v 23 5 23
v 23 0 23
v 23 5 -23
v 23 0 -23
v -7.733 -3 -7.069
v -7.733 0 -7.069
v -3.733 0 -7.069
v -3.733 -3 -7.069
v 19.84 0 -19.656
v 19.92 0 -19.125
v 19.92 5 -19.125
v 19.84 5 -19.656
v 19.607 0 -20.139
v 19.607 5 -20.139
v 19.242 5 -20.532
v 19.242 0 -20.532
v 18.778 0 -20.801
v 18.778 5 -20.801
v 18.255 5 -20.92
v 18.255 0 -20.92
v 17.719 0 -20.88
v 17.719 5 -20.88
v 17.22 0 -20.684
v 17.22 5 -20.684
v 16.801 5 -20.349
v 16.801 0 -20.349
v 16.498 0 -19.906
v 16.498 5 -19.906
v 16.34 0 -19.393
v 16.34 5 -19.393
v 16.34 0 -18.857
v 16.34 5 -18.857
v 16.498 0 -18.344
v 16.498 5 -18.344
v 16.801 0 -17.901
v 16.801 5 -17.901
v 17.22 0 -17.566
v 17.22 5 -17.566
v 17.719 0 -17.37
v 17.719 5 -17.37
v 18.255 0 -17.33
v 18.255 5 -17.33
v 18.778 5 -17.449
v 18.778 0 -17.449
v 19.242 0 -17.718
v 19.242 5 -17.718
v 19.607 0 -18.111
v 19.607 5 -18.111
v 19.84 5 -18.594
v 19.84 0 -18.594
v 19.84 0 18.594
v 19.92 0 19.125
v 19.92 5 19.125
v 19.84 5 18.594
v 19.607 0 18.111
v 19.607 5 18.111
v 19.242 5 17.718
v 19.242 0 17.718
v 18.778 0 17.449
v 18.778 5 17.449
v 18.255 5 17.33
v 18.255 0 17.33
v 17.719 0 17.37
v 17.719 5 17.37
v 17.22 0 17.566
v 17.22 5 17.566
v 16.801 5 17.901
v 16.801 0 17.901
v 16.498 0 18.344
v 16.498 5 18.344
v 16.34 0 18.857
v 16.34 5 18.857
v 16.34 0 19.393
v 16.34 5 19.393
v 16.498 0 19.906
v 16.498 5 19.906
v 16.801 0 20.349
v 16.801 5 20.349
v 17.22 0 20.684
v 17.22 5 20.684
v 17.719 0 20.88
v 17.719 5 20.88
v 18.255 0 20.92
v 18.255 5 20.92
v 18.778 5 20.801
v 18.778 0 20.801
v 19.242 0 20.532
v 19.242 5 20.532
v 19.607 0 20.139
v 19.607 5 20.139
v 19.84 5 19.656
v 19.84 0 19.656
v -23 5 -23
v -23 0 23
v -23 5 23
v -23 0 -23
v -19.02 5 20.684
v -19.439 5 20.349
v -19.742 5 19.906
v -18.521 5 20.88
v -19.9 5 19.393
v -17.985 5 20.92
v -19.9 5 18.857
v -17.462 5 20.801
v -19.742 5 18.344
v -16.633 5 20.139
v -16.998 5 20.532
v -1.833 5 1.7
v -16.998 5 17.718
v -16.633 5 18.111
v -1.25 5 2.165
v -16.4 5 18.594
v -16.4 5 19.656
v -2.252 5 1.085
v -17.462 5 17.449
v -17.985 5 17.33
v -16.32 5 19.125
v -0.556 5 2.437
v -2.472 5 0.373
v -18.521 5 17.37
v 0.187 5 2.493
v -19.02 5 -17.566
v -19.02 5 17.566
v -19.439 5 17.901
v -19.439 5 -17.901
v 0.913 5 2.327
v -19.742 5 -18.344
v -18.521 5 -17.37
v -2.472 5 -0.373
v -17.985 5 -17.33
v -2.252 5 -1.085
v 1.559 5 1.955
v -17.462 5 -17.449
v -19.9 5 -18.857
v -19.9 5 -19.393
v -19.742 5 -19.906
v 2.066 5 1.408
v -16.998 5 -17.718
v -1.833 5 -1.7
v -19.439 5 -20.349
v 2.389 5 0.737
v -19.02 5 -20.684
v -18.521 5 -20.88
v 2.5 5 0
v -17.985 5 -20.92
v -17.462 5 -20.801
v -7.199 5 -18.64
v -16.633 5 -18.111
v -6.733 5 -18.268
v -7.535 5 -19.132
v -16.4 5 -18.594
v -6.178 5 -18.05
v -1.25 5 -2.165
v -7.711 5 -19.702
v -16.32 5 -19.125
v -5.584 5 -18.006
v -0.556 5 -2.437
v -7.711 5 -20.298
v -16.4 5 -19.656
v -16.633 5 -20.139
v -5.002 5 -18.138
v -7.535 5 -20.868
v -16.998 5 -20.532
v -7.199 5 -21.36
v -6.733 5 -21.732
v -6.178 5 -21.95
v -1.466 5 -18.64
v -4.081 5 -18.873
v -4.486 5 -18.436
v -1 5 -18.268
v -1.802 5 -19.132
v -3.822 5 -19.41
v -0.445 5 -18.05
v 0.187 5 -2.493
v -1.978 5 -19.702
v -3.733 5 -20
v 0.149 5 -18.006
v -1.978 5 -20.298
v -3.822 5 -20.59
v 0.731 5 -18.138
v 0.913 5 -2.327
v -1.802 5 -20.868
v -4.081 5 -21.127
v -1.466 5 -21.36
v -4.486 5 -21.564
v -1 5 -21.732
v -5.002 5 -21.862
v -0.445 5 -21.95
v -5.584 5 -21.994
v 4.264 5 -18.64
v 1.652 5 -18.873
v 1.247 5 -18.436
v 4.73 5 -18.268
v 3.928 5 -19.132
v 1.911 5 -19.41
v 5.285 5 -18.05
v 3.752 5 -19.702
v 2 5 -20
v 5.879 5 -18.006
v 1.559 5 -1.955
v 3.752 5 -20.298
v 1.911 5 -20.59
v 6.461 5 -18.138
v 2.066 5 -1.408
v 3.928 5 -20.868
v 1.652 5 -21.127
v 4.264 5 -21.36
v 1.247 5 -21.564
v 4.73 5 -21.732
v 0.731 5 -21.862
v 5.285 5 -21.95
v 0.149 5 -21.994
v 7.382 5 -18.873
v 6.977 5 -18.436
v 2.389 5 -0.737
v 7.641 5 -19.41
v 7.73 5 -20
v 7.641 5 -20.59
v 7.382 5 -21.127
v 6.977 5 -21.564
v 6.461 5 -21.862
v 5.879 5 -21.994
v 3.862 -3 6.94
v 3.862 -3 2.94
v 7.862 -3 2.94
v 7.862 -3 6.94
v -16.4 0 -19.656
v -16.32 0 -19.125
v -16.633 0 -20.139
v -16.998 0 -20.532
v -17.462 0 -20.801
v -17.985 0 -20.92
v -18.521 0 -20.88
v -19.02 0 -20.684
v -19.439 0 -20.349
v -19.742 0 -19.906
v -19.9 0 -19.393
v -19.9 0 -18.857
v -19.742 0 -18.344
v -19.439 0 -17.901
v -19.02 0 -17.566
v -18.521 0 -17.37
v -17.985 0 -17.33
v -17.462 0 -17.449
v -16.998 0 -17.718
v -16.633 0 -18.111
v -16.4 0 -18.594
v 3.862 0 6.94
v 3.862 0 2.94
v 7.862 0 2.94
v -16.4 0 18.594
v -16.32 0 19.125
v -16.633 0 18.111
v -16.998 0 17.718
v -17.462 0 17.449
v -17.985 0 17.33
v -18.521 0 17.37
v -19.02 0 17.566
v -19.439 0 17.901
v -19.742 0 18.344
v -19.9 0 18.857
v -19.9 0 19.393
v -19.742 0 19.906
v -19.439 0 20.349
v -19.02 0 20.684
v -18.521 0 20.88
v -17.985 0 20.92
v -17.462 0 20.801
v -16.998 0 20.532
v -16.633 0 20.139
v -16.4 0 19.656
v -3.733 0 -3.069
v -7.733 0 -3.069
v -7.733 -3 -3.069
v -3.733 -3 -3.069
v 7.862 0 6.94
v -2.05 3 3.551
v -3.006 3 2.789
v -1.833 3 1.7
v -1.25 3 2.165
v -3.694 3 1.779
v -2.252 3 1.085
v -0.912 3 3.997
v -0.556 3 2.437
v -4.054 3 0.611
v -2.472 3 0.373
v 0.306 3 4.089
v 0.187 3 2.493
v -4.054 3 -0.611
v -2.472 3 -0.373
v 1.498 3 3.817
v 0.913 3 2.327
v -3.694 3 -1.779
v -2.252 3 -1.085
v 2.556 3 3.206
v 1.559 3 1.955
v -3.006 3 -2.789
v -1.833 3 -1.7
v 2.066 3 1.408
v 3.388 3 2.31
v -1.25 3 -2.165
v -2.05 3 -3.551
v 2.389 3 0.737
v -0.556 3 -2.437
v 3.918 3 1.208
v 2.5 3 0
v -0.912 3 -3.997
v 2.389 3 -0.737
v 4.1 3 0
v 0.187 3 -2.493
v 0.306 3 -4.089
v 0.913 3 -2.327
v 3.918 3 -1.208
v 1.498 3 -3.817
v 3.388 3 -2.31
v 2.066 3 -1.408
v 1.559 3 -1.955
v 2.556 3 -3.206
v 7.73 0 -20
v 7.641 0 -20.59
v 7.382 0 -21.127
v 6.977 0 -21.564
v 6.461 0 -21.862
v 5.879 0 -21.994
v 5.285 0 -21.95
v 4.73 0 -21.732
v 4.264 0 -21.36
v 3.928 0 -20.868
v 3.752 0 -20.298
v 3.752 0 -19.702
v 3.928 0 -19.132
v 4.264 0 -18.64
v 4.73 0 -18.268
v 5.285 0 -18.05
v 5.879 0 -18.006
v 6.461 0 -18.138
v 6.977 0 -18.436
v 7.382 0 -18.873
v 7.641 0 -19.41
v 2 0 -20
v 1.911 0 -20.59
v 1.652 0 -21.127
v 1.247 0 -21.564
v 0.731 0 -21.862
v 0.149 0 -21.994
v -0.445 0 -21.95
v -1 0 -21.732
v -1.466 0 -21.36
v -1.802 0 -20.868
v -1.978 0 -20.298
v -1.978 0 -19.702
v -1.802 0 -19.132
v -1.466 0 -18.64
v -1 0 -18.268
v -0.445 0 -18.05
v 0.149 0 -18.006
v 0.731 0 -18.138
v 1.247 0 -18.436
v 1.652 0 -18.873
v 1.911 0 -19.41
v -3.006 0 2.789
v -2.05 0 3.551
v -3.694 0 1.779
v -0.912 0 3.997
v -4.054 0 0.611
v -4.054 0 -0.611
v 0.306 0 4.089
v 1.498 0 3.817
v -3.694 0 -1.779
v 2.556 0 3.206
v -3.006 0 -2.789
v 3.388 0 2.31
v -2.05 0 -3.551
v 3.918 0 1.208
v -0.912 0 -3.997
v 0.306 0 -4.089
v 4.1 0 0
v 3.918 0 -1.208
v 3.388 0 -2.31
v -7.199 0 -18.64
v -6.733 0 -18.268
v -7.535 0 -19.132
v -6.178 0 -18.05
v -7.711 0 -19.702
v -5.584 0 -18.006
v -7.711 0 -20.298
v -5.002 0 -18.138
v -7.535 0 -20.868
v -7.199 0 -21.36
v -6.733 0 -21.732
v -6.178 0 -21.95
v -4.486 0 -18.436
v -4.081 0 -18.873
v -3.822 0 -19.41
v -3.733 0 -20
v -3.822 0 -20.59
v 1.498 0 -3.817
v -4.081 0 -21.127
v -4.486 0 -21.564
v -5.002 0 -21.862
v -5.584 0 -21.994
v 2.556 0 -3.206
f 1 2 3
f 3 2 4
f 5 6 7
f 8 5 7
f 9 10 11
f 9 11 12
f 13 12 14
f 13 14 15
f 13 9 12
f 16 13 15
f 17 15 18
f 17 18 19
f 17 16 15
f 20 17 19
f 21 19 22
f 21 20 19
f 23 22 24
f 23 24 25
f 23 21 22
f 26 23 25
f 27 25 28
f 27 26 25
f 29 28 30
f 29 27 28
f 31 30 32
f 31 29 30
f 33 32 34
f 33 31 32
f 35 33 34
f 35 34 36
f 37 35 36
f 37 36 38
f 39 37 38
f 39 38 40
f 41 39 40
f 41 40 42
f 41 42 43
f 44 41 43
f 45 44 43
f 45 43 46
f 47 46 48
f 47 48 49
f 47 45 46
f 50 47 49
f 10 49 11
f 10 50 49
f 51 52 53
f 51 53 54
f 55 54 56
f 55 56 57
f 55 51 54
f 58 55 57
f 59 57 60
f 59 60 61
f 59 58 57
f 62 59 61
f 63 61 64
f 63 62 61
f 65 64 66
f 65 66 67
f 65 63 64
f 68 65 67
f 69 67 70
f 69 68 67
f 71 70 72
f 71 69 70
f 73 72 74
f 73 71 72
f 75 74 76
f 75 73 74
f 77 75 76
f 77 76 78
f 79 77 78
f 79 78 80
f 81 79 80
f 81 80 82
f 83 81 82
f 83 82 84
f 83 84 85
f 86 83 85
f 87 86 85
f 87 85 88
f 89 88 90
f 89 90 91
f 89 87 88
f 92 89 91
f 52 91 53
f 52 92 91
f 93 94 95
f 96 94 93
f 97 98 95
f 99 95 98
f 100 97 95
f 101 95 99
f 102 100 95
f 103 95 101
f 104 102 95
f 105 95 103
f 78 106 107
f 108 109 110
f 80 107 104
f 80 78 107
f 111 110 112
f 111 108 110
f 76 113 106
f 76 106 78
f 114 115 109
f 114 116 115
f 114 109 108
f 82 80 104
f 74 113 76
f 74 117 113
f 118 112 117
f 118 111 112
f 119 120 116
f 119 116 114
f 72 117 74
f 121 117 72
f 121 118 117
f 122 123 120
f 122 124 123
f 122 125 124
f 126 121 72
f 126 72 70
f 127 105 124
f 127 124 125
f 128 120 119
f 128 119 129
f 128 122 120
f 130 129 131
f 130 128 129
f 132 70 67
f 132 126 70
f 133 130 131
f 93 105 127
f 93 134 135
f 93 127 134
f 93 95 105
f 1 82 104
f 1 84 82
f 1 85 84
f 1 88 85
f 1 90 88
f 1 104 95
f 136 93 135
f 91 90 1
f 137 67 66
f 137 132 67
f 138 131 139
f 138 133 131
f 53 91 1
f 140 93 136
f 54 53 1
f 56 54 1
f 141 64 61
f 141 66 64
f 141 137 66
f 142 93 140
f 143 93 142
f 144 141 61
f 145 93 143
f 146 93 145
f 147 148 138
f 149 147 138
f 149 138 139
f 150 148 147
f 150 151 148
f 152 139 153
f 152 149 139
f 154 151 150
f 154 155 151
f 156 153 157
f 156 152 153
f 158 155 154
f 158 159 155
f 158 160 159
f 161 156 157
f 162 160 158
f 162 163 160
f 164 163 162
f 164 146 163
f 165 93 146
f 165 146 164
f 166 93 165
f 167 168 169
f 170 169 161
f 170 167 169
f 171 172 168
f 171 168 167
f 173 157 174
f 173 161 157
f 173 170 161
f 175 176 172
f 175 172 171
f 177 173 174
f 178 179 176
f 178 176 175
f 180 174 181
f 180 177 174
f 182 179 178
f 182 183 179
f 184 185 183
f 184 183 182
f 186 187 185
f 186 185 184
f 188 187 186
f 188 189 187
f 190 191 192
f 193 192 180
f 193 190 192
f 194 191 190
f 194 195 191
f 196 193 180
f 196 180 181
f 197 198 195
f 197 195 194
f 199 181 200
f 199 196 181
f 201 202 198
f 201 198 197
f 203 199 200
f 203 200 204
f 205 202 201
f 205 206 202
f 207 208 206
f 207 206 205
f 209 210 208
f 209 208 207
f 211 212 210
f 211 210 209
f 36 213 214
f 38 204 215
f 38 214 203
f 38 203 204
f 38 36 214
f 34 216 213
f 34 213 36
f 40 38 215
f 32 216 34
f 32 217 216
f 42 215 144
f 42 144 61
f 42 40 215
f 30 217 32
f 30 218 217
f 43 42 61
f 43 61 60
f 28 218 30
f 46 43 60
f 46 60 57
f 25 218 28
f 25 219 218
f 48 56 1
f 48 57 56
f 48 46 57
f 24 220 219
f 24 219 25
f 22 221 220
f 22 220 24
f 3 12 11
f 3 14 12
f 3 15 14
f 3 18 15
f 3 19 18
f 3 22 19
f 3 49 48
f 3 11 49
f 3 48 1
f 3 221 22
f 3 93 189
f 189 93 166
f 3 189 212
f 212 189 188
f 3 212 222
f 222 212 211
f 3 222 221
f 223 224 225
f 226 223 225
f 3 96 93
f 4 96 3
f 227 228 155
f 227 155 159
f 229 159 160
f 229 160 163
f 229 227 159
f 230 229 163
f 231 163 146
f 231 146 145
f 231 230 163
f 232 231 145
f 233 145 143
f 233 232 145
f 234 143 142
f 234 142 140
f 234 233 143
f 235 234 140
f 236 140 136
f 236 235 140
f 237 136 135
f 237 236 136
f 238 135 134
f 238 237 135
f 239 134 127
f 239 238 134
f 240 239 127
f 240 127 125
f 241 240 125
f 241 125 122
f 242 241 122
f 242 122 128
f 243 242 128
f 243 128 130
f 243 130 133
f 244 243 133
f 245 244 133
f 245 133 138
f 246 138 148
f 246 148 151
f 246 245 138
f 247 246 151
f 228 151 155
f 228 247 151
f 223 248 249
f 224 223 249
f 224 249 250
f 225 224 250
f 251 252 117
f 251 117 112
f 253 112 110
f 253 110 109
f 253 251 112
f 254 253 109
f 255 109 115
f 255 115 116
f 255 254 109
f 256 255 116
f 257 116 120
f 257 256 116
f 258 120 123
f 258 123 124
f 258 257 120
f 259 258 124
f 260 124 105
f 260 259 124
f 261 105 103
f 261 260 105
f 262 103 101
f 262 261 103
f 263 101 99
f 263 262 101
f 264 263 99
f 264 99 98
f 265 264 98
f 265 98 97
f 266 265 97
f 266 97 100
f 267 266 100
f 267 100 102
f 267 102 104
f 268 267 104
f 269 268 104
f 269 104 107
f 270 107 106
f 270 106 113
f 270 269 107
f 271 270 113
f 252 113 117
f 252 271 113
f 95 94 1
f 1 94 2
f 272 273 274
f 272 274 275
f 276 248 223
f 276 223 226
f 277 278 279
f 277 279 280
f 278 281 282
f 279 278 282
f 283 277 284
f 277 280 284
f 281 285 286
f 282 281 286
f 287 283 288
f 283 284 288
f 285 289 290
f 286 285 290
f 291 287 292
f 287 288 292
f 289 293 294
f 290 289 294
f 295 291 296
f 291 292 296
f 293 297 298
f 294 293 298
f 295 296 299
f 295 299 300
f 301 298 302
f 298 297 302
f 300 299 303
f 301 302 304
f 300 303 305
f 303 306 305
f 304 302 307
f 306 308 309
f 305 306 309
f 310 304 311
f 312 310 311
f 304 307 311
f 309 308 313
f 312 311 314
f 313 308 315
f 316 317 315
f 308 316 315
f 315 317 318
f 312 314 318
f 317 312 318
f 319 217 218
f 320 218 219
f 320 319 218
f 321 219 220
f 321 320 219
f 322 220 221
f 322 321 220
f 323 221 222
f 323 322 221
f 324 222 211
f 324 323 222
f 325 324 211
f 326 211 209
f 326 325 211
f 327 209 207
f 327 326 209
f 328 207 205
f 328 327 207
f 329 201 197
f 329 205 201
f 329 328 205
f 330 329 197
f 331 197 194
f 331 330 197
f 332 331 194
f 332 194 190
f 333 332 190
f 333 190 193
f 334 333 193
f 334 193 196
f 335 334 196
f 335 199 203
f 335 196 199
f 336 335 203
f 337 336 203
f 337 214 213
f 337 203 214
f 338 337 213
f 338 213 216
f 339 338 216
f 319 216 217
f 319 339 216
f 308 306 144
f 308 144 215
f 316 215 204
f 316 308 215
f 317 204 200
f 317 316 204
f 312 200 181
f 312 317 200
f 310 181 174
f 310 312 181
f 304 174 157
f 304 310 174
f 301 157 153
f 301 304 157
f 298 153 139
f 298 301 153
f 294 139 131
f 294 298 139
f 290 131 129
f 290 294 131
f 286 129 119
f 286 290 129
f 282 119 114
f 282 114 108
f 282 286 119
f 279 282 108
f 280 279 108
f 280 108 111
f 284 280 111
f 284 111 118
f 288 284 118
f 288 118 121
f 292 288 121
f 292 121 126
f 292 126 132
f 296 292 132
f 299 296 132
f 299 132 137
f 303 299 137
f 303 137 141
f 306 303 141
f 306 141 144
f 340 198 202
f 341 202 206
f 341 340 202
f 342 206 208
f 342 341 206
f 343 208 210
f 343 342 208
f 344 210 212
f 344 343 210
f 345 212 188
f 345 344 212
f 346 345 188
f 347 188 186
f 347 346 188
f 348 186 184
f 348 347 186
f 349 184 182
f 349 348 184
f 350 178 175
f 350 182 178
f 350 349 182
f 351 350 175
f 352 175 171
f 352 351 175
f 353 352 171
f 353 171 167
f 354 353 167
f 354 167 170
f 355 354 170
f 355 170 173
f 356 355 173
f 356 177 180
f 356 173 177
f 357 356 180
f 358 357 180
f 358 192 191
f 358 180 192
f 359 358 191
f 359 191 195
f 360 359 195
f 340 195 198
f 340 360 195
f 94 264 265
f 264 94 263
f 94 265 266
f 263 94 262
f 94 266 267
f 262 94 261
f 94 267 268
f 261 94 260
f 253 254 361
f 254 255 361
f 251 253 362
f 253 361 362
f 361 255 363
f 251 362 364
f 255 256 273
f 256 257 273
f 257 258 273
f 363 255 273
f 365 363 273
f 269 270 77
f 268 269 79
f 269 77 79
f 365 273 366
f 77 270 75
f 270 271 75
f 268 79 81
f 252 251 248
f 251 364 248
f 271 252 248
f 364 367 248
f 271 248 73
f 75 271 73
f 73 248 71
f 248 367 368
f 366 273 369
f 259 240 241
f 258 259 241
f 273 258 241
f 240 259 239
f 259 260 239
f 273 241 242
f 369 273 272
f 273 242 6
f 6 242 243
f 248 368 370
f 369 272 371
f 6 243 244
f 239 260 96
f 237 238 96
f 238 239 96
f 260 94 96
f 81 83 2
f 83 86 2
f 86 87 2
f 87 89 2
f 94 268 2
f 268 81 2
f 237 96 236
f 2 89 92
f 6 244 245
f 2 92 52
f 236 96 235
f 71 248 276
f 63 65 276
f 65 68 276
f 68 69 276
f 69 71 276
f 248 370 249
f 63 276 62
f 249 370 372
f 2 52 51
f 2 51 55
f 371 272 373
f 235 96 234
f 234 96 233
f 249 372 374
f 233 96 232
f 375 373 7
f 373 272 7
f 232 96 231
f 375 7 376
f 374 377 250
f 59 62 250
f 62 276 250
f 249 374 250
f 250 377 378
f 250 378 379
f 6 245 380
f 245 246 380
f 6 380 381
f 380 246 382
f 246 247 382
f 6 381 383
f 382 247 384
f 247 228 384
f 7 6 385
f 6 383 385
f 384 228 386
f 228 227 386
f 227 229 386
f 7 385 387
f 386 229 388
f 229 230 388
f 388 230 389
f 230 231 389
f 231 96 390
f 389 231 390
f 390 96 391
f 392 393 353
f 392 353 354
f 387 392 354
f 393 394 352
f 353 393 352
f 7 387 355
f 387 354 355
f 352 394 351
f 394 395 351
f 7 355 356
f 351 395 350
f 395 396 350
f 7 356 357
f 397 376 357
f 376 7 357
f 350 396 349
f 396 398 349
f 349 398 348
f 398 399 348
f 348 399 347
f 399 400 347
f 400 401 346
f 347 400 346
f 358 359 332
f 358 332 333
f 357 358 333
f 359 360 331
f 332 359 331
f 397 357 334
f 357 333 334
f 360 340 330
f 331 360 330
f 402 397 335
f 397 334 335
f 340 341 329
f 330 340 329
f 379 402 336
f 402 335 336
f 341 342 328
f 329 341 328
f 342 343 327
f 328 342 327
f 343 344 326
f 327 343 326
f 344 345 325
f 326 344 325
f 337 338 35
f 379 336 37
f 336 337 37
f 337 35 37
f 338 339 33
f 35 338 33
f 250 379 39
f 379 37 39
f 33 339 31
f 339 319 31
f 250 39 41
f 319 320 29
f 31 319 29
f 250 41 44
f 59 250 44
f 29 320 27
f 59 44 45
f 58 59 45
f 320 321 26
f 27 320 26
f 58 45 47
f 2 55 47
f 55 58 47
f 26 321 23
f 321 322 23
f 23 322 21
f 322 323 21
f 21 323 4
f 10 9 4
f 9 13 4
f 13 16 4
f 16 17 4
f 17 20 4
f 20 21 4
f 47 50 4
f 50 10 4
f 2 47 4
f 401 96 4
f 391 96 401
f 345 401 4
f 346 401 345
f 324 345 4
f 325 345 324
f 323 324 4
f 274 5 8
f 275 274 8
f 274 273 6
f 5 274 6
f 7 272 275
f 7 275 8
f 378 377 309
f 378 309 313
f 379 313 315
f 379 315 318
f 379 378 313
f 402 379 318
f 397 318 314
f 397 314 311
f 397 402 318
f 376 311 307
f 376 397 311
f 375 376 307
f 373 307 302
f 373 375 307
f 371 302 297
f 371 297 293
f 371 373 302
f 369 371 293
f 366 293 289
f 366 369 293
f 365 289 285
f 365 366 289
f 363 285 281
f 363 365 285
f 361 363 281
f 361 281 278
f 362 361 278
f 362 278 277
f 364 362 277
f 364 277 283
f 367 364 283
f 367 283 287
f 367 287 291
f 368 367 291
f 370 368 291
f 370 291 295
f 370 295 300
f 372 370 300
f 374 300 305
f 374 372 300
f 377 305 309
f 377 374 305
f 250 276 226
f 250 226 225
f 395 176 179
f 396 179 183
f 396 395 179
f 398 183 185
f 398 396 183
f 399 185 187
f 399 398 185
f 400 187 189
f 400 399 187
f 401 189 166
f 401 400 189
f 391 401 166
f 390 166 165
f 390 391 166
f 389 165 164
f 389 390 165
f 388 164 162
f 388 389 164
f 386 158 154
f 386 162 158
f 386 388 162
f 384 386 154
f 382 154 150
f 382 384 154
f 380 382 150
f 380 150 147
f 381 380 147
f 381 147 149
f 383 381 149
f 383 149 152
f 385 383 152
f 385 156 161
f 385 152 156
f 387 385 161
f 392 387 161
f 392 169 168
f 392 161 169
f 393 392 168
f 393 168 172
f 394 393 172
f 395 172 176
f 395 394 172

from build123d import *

# Parameters (mm, degrees)
SKETCH2_W           = 46
SKETCH2_H           = 46
BOSS_EXTRUDE1_DEPTH = 5
SKETCH3_R           = 1.8
SKETCH3_R_2         = 2.5
CUT_EXTRUDE1_DEPTH  = 5
SKETCH4_R           = 4.1
CUT_EXTRUDE2_DEPTH  = 3
SKETCH5_W           = 4
SKETCH5_H           = 4
BOSS_EXTRUDE2_DEPTH = 3
SKETCH9_R           = 2
CUT_EXTRUDE6_DEPTH  = 6


with BuildPart() as part:
    # Sketch2 → Boss-Extrude1 (new body)
    with BuildSketch(Plane(origin=(0, 0, 0), x_dir=(1, 0, 0), z_dir=(0, 1, 0))):
        Rectangle(SKETCH2_W, SKETCH2_H)
    extrude(amount=BOSS_EXTRUDE1_DEPTH)

    # Sketch3 → Cut-Extrude1 (cut)
    with BuildSketch(Plane(origin=(0, 0, 0), x_dir=(1, 0, 0), z_dir=(0, 1, 0))):
        with Locations((-18.12, 19.125)):
            Circle(SKETCH3_R)
        with Locations((18.12, 19.125)):
            Circle(SKETCH3_R)
        with Locations((18.12, -19.125)):
            Circle(SKETCH3_R)
        with Locations((-18.12, -19.125)):
            Circle(SKETCH3_R)
        Circle(SKETCH3_R_2)
    extrude(amount=CUT_EXTRUDE1_DEPTH, mode=Mode.SUBTRACT)

    # Sketch4 → Cut-Extrude2 (cut)
    with BuildSketch(Plane(origin=(0, 0, 0), x_dir=(1, 0, 0), z_dir=(0, 1, 0))):
        Circle(SKETCH4_R)
    extrude(amount=CUT_EXTRUDE2_DEPTH, mode=Mode.SUBTRACT)

    # Sketch5 → Boss-Extrude2 (add)
    with BuildSketch(Plane(origin=(0, 0, 0), x_dir=(1, 0, 0), z_dir=(0, 1, 0))):
        with Locations((-5.7330026, 5.06948708)):
            Rectangle(SKETCH5_W, SKETCH5_H)
        with Locations((5.862376563, -4.939727226)):
            Rectangle(SKETCH5_W, SKETCH5_H)
    extrude(amount=-BOSS_EXTRUDE2_DEPTH)

    # Sketch9 → Cut-Extrude6 (cut, through all)
    with BuildSketch(Plane(origin=(0, 0, 0), x_dir=(1, 0, 0), z_dir=(0, 1, 0))):
        with Locations((-5.7330026, 20)):
            Circle(SKETCH9_R)
        with Locations((5.73, 20)):
            Circle(SKETCH9_R)
        with Locations((0, 20)):
            Circle(SKETCH9_R)
    extrude(amount=CUT_EXTRUDE6_DEPTH, mode=Mode.SUBTRACT)


solid = part.part
